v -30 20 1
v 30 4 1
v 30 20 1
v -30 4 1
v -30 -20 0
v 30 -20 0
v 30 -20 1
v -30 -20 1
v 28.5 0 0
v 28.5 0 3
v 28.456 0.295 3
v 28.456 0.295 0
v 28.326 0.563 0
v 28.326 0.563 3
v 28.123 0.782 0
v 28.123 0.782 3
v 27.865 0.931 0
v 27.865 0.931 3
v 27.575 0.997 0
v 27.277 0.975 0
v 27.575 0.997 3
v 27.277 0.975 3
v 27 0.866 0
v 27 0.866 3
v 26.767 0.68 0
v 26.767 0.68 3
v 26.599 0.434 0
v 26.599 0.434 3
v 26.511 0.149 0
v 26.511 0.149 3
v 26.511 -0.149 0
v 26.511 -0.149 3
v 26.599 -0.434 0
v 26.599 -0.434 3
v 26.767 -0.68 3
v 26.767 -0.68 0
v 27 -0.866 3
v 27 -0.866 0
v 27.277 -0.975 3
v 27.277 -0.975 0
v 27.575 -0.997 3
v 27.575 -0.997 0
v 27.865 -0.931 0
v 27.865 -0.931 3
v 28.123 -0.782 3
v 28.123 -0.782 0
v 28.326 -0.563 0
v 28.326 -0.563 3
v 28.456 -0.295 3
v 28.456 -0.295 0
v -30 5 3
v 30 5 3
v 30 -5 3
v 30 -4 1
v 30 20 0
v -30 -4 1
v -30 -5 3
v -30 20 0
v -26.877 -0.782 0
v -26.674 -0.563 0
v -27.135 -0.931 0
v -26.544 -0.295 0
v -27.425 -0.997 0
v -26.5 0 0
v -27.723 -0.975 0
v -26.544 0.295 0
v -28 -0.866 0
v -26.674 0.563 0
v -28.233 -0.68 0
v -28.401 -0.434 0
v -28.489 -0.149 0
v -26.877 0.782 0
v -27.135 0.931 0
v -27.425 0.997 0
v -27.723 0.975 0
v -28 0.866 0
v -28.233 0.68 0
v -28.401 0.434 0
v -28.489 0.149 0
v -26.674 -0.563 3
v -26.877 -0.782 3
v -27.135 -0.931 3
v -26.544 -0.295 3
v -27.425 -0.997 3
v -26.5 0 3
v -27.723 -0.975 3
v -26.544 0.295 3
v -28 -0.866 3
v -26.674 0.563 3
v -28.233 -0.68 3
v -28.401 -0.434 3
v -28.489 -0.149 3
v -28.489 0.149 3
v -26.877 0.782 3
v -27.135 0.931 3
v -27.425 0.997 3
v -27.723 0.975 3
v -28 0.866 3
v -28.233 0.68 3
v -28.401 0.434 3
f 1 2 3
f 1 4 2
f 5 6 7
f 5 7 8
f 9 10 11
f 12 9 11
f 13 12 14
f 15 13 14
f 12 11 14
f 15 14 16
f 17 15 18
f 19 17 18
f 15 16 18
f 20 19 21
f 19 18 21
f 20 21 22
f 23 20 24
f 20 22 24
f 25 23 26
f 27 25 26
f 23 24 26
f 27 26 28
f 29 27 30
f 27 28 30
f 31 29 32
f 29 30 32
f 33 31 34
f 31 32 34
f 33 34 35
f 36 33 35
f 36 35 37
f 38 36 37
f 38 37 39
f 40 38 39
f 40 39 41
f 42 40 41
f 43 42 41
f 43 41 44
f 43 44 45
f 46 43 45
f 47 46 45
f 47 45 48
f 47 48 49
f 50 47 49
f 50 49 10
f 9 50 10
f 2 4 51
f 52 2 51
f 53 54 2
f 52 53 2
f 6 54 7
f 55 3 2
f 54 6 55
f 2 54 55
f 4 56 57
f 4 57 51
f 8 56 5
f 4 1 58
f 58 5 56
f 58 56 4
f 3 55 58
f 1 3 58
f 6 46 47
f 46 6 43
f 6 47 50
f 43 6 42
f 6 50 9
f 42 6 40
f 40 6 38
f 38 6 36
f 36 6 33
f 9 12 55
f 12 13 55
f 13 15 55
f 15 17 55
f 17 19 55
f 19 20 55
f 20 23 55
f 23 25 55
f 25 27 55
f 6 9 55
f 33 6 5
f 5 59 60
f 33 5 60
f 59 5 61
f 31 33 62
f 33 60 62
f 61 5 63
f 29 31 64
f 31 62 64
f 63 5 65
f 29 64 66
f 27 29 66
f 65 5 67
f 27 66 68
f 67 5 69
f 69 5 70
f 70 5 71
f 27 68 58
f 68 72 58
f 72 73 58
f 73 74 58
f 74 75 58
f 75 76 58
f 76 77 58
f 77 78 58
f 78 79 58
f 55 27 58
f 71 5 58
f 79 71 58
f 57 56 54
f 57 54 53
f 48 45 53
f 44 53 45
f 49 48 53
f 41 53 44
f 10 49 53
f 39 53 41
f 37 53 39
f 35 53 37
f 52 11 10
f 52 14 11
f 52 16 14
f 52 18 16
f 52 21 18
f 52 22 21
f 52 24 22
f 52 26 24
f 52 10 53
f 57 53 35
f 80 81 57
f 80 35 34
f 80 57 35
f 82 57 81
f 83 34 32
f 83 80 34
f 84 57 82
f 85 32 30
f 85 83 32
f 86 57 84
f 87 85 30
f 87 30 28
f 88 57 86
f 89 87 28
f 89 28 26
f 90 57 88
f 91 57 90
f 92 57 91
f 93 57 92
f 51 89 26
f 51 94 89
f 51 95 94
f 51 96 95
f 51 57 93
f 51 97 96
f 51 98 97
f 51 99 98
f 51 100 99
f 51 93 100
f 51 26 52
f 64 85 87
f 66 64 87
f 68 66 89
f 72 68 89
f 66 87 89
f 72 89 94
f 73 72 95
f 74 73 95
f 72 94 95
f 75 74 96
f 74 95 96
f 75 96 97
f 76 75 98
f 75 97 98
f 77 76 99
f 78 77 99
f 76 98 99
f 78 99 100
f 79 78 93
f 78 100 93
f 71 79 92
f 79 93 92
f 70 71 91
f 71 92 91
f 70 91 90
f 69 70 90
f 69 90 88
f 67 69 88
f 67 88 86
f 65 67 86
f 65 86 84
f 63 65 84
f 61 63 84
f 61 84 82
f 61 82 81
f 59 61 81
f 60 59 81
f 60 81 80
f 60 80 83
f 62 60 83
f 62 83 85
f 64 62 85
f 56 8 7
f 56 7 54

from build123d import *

# Parameters (mm, degrees)
SKETCH1_W             = 15
SKETCH1_H             = 60
BOSS_EXTRUDE1_DEPTH   = 1
BOSS_EXTRUDE1_2_DEPTH = 1
SKETCH1_3_W           = 10
SKETCH1_3_H           = 60
BOSS_EXTRUDE2_DEPTH   = 3
CUT_EXTRUDE1_DEPTH    = 66
SKETCH5_R             = 1
CUT_EXTRUDE2_DEPTH    = 10


with BuildPart() as part:
    # Sketch1 → Boss-Extrude1 (new body)
    with BuildSketch(Plane(origin=(0, 0, 0), x_dir=(0, 1, 0), z_dir=(0, 0, 1))):
        with Locations((-12.5, 0)):
            Rectangle(SKETCH1_W, SKETCH1_H)
    extrude(amount=BOSS_EXTRUDE1_DEPTH)



with BuildPart() as body_2:
    # Sketch1 → Boss-Extrude1 2 (new body)
    with BuildSketch(Plane(origin=(0, 0, 0), x_dir=(0, 1, 0), z_dir=(0, 0, 1))):
        with Locations((12.5, 0)):
            Rectangle(SKETCH1_W, SKETCH1_H)
    extrude(amount=BOSS_EXTRUDE1_2_DEPTH)


with BuildPart() as part_1:
    add(part.part)

    add(body_2.part)  # Boss-Extrude2 merges body 2
    # Sketch1<3> → Boss-Extrude2 (add)
    with BuildSketch(Plane(origin=(0, 0, 0), x_dir=(0, 1, 0), z_dir=(0, 0, 1))):
        Rectangle(SKETCH1_3_W, SKETCH1_3_H)
    extrude(amount=BOSS_EXTRUDE2_DEPTH)

    # Sketch2 → Cut-Extrude1 (cut)
    with BuildSketch(Plane.YZ.offset(30)):
        Polygon((-5, 1), (-4, 1), (-5, 3), align=None)
        Polygon((5, 1), (4, 1), (5, 3), align=None)
    extrude(amount=-CUT_EXTRUDE1_DEPTH, mode=Mode.SUBTRACT)

    # Sketch5 → Cut-Extrude2 (cut)
    with BuildSketch(Plane.XY.offset(3)):
        with Locations((-27.5, 0)):
            Circle(SKETCH5_R)
        with Locations((27.5, 0)):
            Circle(SKETCH5_R)
    extrude(amount=-CUT_EXTRUDE2_DEPTH, mode=Mode.SUBTRACT)


solid = part_1.part
